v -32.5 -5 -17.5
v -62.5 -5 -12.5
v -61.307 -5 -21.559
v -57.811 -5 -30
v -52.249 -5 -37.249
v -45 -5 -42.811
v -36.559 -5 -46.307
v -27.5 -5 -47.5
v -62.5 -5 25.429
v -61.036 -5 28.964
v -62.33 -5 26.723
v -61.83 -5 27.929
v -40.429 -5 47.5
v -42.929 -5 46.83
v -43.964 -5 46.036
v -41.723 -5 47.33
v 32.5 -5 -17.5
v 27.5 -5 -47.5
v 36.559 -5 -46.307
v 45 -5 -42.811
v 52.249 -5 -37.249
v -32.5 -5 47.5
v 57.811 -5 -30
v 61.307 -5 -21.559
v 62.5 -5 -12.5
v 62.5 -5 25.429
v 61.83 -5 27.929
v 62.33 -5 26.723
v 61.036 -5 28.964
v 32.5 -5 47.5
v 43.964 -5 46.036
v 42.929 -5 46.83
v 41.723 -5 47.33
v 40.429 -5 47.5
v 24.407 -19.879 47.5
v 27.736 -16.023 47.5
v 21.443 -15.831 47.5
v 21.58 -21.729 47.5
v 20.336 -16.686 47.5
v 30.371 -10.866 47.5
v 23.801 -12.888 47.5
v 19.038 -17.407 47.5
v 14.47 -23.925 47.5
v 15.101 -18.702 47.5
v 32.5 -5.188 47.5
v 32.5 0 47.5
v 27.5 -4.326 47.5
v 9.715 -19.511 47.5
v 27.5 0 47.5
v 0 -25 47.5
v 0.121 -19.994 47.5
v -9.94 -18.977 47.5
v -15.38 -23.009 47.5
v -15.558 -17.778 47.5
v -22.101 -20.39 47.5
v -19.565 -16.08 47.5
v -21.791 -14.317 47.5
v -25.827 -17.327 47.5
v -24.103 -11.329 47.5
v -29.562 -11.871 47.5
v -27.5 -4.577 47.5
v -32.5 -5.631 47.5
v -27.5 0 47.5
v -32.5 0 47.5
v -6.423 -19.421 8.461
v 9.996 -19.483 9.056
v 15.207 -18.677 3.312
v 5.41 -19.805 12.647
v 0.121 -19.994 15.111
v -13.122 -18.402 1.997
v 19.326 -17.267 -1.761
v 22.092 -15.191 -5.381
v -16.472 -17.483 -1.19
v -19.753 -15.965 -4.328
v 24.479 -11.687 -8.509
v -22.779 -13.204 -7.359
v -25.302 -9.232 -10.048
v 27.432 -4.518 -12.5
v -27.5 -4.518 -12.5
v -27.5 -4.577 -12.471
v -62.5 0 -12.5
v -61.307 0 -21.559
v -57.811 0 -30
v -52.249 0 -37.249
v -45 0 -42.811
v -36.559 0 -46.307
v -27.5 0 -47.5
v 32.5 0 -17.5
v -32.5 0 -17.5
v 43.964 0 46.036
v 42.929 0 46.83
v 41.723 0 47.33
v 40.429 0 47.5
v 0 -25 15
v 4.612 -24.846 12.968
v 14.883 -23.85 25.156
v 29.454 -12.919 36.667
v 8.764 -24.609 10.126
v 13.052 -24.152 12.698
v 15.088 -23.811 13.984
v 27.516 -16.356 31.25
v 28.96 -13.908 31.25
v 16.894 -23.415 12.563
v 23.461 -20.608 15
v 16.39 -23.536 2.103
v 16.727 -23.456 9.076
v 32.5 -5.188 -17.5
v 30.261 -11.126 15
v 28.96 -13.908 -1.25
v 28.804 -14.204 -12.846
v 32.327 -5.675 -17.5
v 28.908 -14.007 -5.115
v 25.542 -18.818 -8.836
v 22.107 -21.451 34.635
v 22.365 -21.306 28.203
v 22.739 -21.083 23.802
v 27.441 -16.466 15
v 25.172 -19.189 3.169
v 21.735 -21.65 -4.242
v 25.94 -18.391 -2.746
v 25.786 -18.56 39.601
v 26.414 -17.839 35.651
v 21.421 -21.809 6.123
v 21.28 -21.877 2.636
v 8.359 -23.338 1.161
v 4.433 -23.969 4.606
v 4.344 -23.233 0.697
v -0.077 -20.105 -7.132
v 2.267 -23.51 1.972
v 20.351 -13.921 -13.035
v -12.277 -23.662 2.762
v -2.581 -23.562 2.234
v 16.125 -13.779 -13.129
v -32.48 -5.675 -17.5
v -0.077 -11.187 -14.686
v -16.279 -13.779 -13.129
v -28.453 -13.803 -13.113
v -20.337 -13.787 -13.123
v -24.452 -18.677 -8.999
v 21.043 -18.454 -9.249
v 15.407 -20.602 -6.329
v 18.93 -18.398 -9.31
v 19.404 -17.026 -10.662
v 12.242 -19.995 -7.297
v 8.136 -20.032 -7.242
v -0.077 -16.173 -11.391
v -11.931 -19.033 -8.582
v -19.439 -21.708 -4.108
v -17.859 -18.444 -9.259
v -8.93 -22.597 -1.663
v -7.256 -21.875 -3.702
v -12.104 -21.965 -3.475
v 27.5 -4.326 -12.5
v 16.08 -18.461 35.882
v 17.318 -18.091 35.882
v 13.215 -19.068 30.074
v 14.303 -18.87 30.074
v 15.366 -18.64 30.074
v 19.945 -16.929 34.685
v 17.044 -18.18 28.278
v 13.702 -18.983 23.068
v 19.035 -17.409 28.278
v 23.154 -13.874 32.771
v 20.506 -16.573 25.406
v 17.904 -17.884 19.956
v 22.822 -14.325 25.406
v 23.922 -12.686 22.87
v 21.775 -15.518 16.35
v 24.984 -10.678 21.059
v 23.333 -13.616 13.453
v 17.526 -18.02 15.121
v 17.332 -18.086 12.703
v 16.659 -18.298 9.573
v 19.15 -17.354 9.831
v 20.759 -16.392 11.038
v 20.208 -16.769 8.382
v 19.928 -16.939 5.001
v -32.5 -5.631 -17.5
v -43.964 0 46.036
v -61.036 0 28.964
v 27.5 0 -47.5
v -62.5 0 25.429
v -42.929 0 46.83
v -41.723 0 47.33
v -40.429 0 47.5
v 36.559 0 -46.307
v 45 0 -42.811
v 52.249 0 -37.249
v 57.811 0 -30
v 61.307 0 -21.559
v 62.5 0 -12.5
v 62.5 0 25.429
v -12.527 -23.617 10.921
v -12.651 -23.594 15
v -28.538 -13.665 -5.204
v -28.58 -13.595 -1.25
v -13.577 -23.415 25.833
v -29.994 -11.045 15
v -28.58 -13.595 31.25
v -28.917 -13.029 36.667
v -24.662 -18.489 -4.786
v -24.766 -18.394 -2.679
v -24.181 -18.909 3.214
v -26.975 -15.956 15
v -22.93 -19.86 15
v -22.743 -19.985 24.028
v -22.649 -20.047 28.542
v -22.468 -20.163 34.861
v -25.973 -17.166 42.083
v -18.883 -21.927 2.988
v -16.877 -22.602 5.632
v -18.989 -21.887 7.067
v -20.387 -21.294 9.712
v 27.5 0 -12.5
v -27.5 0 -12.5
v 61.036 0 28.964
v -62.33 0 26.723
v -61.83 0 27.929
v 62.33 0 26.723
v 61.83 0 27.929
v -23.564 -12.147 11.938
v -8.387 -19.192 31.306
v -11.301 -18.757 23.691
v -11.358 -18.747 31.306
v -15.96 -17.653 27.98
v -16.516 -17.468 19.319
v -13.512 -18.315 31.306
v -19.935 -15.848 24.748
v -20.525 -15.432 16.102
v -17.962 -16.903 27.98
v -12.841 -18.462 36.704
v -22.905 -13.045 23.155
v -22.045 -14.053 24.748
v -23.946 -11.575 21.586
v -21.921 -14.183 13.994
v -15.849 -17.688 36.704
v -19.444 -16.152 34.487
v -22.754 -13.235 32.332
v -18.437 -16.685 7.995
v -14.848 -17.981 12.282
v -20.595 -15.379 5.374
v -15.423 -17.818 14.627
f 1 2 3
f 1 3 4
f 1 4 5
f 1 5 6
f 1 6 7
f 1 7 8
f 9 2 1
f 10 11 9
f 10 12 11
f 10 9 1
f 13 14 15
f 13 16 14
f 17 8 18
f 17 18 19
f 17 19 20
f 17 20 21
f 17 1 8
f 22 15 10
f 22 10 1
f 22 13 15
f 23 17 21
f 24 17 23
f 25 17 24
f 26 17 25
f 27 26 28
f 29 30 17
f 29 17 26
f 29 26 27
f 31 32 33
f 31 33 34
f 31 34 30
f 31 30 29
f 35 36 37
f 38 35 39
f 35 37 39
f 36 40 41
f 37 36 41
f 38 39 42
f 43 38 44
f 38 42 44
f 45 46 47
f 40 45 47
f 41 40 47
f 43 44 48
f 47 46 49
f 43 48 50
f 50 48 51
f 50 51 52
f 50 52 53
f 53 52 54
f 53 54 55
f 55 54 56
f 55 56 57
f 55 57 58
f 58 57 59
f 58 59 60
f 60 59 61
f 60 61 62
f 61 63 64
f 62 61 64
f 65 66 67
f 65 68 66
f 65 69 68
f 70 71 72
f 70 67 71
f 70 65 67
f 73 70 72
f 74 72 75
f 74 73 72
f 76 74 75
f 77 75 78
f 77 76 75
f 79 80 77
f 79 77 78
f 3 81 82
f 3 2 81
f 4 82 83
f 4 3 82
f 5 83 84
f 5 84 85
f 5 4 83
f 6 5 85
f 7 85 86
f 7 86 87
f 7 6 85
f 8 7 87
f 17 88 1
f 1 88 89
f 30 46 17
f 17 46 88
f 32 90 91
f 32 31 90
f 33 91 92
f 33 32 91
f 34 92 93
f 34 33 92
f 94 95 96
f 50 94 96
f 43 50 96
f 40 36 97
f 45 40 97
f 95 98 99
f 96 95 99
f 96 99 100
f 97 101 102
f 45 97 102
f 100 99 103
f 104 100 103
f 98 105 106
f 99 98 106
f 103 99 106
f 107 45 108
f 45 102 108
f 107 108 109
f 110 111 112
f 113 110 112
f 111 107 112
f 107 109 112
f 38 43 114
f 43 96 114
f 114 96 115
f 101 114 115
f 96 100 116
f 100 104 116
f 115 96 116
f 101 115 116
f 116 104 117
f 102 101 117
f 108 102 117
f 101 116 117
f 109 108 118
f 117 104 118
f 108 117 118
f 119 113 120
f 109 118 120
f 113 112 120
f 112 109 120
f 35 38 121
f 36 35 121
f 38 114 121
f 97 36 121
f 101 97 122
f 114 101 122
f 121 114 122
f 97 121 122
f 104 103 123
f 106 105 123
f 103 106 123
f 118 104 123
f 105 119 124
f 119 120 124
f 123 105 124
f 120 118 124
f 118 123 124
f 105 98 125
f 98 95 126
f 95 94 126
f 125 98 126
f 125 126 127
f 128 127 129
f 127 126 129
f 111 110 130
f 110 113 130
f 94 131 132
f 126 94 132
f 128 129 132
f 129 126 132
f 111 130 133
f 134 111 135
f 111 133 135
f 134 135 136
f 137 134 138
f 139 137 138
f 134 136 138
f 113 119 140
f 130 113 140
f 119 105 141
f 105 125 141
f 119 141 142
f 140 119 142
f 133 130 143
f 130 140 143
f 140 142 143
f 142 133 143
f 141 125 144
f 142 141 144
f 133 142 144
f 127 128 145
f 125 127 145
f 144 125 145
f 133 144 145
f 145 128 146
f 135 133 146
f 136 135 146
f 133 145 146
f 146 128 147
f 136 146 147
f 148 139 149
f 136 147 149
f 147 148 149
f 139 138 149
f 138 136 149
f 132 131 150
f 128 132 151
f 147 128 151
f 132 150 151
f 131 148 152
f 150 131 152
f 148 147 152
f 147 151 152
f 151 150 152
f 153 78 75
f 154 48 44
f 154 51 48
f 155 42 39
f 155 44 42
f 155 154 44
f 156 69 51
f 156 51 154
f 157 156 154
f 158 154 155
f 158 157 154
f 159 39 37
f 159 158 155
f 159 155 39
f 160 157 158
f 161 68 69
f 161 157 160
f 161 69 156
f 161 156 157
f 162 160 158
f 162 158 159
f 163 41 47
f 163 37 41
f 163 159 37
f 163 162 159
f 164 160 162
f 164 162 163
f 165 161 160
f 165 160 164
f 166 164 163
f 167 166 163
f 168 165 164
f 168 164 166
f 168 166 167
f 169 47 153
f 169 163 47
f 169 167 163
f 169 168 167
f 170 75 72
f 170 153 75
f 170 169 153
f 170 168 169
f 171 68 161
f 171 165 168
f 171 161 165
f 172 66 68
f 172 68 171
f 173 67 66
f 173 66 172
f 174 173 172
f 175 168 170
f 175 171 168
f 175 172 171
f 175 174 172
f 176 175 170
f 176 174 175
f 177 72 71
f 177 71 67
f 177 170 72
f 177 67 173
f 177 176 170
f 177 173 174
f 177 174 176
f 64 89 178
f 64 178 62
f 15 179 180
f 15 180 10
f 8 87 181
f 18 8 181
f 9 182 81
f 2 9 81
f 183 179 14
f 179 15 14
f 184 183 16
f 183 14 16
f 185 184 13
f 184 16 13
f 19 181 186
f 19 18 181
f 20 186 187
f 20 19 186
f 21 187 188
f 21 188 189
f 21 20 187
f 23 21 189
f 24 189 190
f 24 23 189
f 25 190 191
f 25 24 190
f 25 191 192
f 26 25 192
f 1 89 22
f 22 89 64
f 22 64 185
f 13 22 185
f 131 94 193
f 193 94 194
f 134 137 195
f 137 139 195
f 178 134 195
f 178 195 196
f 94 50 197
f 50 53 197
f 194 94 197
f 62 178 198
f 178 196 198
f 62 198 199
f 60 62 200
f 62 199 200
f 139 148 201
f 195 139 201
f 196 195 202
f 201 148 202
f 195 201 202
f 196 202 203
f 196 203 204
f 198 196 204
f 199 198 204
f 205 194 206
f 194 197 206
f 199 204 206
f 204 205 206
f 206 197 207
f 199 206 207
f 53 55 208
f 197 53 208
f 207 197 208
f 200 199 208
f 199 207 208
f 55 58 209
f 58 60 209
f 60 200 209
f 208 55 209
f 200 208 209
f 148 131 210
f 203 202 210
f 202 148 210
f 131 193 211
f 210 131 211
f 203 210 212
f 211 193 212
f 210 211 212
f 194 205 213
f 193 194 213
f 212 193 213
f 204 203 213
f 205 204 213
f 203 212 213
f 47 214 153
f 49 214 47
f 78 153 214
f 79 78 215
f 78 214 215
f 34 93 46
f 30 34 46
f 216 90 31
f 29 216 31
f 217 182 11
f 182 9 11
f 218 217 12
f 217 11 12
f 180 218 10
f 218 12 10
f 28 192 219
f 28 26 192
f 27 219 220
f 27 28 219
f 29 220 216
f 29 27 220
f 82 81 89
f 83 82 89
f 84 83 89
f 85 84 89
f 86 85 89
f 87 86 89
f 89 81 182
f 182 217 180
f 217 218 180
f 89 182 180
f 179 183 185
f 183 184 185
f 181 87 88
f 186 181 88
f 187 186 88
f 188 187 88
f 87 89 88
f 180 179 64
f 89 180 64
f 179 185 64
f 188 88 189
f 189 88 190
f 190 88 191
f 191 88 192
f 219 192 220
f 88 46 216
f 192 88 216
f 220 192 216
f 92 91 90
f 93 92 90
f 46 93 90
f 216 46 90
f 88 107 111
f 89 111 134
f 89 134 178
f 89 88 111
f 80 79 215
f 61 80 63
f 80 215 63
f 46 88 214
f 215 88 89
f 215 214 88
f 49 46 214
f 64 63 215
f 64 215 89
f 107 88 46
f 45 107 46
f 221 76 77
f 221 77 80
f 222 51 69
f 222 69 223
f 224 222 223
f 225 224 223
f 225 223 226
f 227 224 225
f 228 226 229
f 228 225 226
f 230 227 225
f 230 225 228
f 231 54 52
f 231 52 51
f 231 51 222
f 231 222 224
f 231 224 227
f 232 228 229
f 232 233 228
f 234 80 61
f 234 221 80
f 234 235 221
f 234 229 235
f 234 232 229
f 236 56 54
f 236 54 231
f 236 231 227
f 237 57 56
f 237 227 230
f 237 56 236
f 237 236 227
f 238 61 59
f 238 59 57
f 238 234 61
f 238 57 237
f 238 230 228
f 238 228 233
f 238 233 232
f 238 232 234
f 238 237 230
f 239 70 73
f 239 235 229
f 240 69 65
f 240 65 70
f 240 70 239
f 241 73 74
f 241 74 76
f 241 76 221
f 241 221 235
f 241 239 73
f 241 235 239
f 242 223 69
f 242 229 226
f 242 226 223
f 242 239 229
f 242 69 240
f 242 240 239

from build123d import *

# Parameters (mm, degrees)
F1_DEPTH = 5
F2_W     = 65
F2_H     = 65
F3_DEPTH = 25
F7_DEPTH = 65
F8_DEPTH = 65
F9_DEPTH = 65
F10_R    = 35
F11_R    = 35
F12_SIZE = 20
F13_SIZE = 20
F14_R    = 5
F15_T    = -5


with BuildPart() as f1:
    # F0 (on Front) → F1 (new body)
    with BuildSketch(Plane.XZ):
        Polygon((-62.5, 47.5), (-62.5, -47.5), (62.5, -47.5), (62.5, 47.5), (32.5, 47.5), (32.5, 17.5), (32.5, -17.5), (-32.5, -17.5), (-32.5, 17.5), (-32.5, 47.5), align=None)
    extrude(amount=F1_DEPTH)

    # F10
    f10_edges = [f1.edges().sort_by_distance(p)[0] for p in [
        (-62.5, -2.5, -47.5),
    ]]
    fillet(f10_edges, radius=F10_R)

    # F11
    f11_edges = [f1.edges().sort_by_distance(p)[0] for p in [
        (62.5, -2.5, -47.5),
    ]]
    fillet(f11_edges, radius=F11_R)

    # F12
    f12_edges = [f1.edges().sort_by_distance(p)[0] for p in [
        (62.5, -2.5, 47.5),
    ]]
    chamfer(f12_edges, length=F12_SIZE)

    # F13
    f13_edges = [f1.edges().sort_by_distance(p)[0] for p in [
        (-62.5, -2.5, 47.5),
    ]]
    chamfer(f13_edges, length=F13_SIZE)

    # F14
    f14_edges = [f1.edges().sort_by_distance(p)[0] for p in [
        (42.5, -2.5, 47.5),
        (-42.5, -2.5, 47.5),
        (62.5, -2.5, 27.5),
        (-62.5, -2.5, 27.5),
    ]]
    fillet(f14_edges, radius=F14_R)


with BuildPart() as f3:
    # F2 (on face) → F3 (new body)
    with BuildSketch(Plane(origin=(0, 0, 0), x_dir=(-1, 0, 0), z_dir=(0, 1, 0))):
        with Locations((0, 15)):
            Rectangle(F2_W, F2_H)
    extrude(amount=-F3_DEPTH)

    # F6 (on face) → F7 (cut)
    with BuildSketch(Plane(origin=(0, 0, -17.5), x_dir=(1, 0, 0), z_dir=(0, 0, -1))):
        with BuildLine():
            Line((32.5, 25), (0, 25))
            add(Edge.make_bspline(
                [(0, 25), (8.9831560964, 24.7356032013), (25.7400806439, 24.2424068327), (30.3577846442, 11.2260573238), (32.5, 5.1875934005)],
                knots=[0, 0, 0, 0, 0.5360861676, 1, 1, 1, 1], degree=3))
            Line((32.5, 5.1875934005), (32.5, 25))
        make_face()
    extrude(amount=-F7_DEPTH, mode=Mode.SUBTRACT)

    # F5 (on face) → F8 (cut)
    with BuildSketch(Plane(origin=(-32.5, 0, 0), x_dir=(0, -1, 0), z_dir=(-1, 0, 0))):
        with BuildLine():
            Line((25, -17.5), (25, 15))
            add(Edge.make_bspline(
                [(25, 15), (24.3763252453, 6.7012881278), (23.2004686952, -8.9448490093), (11.2752006062, -14.7662638453), (5.6750960648, -17.5)],
                knots=[0, 0, 0, 0, 0.5303999994, 1, 1, 1, 1], degree=3))
            Line((5.6750960648, -17.5), (25, -17.5))
        make_face()
    extrude(amount=-F8_DEPTH, mode=Mode.SUBTRACT)

    # F4 (on face) → F9 (cut)
    with BuildSketch(Plane.XY.offset(47.5)):
        with BuildLine():
            Line((-32.5, -25), (0, -25))
            add(Edge.make_bspline(
                [(0, -25), (-8.6973164519, -24.3217387105), (-24.8242839164, -23.0640764791), (-30.0791135259, -11.1290940087), (-32.5, -5.6306794286)],
                knots=[0, 0, 0, 0, 0.5393026017, 1, 1, 1, 1], degree=3))
            Line((-32.5, -5.6306794286), (-32.5, -25))
        make_face()
    extrude(amount=-F9_DEPTH, mode=Mode.SUBTRACT)

    # F15
    f15_openings = [f3.faces().sort_by_distance(p)[0] for p in [
        (0.301187, -11.064049, 47.5),
        (0, 0, 15),
    ]]
    offset(amount=F15_T, openings=f15_openings, kind=Kind.INTERSECTION)


solid = Compound([f1.part, f3.part])
